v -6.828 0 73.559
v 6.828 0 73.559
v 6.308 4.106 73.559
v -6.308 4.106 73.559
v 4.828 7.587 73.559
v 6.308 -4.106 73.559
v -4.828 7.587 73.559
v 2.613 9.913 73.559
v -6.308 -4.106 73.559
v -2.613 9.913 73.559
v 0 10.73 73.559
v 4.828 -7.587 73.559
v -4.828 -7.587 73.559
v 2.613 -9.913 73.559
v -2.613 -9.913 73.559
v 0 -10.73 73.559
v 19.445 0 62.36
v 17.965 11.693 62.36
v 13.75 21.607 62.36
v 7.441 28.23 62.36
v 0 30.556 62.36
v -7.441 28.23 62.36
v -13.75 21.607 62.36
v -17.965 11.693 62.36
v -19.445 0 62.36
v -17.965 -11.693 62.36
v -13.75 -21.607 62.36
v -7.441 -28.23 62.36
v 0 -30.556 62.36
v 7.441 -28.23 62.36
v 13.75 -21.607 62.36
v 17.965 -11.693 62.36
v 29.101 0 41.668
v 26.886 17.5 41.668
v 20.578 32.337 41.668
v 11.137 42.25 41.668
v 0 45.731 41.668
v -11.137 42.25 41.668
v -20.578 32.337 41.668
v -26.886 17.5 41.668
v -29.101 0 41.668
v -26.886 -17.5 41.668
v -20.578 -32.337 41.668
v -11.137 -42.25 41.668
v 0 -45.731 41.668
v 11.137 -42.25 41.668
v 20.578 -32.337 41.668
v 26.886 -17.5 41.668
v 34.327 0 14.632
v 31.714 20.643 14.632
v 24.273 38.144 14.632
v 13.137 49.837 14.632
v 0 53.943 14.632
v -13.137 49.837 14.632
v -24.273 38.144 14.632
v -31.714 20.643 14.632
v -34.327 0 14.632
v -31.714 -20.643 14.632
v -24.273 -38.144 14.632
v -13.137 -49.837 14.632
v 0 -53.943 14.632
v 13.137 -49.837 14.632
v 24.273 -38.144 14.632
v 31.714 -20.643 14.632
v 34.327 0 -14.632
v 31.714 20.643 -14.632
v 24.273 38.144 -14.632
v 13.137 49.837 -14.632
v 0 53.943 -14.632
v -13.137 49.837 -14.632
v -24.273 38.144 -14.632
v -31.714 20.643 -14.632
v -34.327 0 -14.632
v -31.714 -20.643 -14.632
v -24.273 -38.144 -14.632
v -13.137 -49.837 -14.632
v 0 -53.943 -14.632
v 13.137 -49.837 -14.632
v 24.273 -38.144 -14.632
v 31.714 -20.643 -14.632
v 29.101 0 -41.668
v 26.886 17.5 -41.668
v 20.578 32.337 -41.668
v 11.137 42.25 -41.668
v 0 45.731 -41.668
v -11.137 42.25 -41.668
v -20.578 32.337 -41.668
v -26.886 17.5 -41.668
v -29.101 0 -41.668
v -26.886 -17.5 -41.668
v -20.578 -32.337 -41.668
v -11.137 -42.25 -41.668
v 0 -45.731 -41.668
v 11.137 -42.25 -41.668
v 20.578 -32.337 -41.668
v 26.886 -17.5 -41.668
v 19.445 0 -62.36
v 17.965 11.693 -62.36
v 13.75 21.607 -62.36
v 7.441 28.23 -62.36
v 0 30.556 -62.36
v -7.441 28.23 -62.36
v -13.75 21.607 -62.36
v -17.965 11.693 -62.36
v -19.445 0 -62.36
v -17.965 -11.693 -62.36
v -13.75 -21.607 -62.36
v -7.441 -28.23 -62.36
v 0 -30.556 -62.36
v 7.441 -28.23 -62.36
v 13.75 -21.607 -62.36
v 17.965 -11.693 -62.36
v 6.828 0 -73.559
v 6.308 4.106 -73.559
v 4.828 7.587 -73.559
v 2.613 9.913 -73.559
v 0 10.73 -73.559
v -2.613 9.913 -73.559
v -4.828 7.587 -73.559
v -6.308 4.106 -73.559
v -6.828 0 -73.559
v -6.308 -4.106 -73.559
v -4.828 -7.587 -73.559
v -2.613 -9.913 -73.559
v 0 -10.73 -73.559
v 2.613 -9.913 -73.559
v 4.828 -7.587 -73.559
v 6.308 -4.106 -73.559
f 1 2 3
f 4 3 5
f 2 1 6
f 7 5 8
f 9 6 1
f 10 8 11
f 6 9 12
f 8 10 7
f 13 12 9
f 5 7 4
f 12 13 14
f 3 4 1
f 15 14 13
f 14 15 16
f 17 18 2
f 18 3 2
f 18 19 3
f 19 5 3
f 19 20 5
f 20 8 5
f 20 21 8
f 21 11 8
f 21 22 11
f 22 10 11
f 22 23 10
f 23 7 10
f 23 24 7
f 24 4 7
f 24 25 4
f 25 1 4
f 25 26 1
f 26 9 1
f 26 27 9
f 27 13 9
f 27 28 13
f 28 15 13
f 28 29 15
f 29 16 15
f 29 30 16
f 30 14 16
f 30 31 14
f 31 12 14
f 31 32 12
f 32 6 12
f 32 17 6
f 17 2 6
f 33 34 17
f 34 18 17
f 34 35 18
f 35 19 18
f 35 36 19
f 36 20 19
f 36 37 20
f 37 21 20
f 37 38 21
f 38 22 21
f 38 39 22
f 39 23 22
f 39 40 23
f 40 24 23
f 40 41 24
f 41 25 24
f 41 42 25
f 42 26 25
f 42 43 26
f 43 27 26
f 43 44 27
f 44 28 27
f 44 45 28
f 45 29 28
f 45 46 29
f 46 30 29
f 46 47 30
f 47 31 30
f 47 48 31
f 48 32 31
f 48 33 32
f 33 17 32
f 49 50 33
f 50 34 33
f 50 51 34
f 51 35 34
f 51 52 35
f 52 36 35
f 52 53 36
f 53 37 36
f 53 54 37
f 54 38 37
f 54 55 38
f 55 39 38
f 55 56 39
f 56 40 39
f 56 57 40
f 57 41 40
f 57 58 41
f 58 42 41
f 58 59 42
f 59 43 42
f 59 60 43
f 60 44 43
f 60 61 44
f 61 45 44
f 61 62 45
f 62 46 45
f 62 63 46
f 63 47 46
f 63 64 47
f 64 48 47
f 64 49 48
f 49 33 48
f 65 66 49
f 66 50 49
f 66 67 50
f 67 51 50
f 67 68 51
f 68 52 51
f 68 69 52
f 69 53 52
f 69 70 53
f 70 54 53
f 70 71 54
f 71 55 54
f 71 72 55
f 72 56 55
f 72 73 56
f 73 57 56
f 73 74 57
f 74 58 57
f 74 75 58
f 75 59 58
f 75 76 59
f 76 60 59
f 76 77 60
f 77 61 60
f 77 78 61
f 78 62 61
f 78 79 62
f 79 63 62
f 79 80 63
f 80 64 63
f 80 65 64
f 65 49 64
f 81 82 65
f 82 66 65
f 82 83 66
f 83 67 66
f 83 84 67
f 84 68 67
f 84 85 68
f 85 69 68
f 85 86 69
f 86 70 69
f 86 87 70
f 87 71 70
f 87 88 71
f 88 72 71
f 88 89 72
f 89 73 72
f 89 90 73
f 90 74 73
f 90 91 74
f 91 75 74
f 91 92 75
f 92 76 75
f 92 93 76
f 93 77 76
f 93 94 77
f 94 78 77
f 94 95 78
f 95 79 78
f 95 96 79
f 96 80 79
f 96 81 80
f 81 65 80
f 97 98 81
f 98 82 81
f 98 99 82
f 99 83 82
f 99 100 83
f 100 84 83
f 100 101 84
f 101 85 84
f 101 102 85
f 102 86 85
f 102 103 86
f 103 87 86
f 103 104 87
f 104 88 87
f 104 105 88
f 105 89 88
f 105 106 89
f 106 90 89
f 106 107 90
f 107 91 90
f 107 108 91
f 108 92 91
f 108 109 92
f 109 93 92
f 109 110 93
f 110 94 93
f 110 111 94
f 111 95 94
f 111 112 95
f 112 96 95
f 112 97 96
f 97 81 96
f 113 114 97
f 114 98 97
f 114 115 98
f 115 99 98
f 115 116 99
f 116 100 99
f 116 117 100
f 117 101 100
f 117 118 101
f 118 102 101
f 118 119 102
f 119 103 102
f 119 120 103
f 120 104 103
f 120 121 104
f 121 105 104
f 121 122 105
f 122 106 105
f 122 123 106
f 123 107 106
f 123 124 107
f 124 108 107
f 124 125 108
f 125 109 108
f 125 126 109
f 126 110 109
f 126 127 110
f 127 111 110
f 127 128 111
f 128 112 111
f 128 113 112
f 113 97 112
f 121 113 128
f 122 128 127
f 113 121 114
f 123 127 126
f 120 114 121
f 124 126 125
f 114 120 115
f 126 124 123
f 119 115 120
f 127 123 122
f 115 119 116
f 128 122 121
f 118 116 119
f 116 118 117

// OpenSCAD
// Generated by SolidPython 1.0.1 on 2020-07-29 00:46:47


scale(v = [7, 11, 15]) {
	sphere(r = 5);
}
/***********************************************
*********      SolidPython code:      **********
************************************************
 
# import packages: SolidPython
from solid import *
from solid.utils import *
from itertools import chain, combinations, permutations


class Resize:

    def __init__(self, scad_file):
        self.scad_file = scad_file
        #self.scad_file = import_scad(scad_file)
        # cone/cylinder param:
        self.r1 = 0
        self.r2 = 0
        self.h = 0
        # rectangular prism param:
        self.w = 0
        self.l = 0
        # ellipse param:
        self.r = 0

    # import OpenScad code (file name corresponds to shape)


    # classify shape + parameters
    def assign(self, param1, param2, param3):
        if self.scad_file == 'cone.scad':
            self.r1 = param1
            self.r2 = param2
            self.h = param3
        elif self.scad_file == 'cylinder.scad':
            self.r1 = param1
            self.r2 = param2
            self.h = param3
        elif self.scad_file == 'rectangularPrism.scad':
            self.h = param1
            self.l = param2
            self.w = param3
        else:
            self.r = param1
            self.h = param2

    # resize parameters
    def iterate(self):
        x = range(3, 20, 2)
        i = 1
        if self.scad_file == 'cone.scad':
            tempList = list(permutations(x, 2))
            for temp in tempList:
                param1 = temp[0]
                param2 = temp[1]
                filepath = 'produced_scad_files/' + 'cone' + str(param1) + '_' + str(param2) + '_' + '.scad'
                scad_render_to_file(cylinder(h=param1, r1=param2, r2=0), filepath)

        elif self.scad_file == 'cylinder.scad':
            tempList = list(permutations(x, 3))
            for temp in tempList:
                param1 = temp[0]
                param2 = temp[1]
                filepath = 'produced_scad_files/' + 'cylinder' + str(param1) + '_' + str(param2) + '_' + '.scad'
                scad_render_to_file(cylinder(h=param1, r1=param2, r2=param2), filepath)

        elif self.scad_file == 'rectangularPrism.scad':
            tempList = list(permutations(x, 3))
            for temp in tempList:
                param1 = temp[0]
                param2 = temp[1]
                param3 = temp[2]
                filepath = 'produced_scad_files/' + 'rectangularPrism' + str(param1) + '_' + str(param2) + '_' + str(
                    param3) + '.scad'
                scad_render_to_file(cube(size=(param1, param2, param3)), filepath)

        elif self.scad_file == 'ellipse.scad':
            tempList = list(permutations(x, 4))
            for temp in tempList:
                param1 = temp[0]
                param2 = temp[1]
                param3 = temp[2]
                param4 = temp[3]
                filepath = 'produced_scad_files/' + 'ellipse' + str(param1) + '_' + str(param2) + '_' + str(param3) + '_' + str(param4) + '.scad'
                scad_render_to_file(scale([param1, param2, param3])(sphere(r=param4)), filepath)

    def render_to_scadfile(self):
        scad_render_to_file(scad, 'example.scad') 
 
************************************************/
